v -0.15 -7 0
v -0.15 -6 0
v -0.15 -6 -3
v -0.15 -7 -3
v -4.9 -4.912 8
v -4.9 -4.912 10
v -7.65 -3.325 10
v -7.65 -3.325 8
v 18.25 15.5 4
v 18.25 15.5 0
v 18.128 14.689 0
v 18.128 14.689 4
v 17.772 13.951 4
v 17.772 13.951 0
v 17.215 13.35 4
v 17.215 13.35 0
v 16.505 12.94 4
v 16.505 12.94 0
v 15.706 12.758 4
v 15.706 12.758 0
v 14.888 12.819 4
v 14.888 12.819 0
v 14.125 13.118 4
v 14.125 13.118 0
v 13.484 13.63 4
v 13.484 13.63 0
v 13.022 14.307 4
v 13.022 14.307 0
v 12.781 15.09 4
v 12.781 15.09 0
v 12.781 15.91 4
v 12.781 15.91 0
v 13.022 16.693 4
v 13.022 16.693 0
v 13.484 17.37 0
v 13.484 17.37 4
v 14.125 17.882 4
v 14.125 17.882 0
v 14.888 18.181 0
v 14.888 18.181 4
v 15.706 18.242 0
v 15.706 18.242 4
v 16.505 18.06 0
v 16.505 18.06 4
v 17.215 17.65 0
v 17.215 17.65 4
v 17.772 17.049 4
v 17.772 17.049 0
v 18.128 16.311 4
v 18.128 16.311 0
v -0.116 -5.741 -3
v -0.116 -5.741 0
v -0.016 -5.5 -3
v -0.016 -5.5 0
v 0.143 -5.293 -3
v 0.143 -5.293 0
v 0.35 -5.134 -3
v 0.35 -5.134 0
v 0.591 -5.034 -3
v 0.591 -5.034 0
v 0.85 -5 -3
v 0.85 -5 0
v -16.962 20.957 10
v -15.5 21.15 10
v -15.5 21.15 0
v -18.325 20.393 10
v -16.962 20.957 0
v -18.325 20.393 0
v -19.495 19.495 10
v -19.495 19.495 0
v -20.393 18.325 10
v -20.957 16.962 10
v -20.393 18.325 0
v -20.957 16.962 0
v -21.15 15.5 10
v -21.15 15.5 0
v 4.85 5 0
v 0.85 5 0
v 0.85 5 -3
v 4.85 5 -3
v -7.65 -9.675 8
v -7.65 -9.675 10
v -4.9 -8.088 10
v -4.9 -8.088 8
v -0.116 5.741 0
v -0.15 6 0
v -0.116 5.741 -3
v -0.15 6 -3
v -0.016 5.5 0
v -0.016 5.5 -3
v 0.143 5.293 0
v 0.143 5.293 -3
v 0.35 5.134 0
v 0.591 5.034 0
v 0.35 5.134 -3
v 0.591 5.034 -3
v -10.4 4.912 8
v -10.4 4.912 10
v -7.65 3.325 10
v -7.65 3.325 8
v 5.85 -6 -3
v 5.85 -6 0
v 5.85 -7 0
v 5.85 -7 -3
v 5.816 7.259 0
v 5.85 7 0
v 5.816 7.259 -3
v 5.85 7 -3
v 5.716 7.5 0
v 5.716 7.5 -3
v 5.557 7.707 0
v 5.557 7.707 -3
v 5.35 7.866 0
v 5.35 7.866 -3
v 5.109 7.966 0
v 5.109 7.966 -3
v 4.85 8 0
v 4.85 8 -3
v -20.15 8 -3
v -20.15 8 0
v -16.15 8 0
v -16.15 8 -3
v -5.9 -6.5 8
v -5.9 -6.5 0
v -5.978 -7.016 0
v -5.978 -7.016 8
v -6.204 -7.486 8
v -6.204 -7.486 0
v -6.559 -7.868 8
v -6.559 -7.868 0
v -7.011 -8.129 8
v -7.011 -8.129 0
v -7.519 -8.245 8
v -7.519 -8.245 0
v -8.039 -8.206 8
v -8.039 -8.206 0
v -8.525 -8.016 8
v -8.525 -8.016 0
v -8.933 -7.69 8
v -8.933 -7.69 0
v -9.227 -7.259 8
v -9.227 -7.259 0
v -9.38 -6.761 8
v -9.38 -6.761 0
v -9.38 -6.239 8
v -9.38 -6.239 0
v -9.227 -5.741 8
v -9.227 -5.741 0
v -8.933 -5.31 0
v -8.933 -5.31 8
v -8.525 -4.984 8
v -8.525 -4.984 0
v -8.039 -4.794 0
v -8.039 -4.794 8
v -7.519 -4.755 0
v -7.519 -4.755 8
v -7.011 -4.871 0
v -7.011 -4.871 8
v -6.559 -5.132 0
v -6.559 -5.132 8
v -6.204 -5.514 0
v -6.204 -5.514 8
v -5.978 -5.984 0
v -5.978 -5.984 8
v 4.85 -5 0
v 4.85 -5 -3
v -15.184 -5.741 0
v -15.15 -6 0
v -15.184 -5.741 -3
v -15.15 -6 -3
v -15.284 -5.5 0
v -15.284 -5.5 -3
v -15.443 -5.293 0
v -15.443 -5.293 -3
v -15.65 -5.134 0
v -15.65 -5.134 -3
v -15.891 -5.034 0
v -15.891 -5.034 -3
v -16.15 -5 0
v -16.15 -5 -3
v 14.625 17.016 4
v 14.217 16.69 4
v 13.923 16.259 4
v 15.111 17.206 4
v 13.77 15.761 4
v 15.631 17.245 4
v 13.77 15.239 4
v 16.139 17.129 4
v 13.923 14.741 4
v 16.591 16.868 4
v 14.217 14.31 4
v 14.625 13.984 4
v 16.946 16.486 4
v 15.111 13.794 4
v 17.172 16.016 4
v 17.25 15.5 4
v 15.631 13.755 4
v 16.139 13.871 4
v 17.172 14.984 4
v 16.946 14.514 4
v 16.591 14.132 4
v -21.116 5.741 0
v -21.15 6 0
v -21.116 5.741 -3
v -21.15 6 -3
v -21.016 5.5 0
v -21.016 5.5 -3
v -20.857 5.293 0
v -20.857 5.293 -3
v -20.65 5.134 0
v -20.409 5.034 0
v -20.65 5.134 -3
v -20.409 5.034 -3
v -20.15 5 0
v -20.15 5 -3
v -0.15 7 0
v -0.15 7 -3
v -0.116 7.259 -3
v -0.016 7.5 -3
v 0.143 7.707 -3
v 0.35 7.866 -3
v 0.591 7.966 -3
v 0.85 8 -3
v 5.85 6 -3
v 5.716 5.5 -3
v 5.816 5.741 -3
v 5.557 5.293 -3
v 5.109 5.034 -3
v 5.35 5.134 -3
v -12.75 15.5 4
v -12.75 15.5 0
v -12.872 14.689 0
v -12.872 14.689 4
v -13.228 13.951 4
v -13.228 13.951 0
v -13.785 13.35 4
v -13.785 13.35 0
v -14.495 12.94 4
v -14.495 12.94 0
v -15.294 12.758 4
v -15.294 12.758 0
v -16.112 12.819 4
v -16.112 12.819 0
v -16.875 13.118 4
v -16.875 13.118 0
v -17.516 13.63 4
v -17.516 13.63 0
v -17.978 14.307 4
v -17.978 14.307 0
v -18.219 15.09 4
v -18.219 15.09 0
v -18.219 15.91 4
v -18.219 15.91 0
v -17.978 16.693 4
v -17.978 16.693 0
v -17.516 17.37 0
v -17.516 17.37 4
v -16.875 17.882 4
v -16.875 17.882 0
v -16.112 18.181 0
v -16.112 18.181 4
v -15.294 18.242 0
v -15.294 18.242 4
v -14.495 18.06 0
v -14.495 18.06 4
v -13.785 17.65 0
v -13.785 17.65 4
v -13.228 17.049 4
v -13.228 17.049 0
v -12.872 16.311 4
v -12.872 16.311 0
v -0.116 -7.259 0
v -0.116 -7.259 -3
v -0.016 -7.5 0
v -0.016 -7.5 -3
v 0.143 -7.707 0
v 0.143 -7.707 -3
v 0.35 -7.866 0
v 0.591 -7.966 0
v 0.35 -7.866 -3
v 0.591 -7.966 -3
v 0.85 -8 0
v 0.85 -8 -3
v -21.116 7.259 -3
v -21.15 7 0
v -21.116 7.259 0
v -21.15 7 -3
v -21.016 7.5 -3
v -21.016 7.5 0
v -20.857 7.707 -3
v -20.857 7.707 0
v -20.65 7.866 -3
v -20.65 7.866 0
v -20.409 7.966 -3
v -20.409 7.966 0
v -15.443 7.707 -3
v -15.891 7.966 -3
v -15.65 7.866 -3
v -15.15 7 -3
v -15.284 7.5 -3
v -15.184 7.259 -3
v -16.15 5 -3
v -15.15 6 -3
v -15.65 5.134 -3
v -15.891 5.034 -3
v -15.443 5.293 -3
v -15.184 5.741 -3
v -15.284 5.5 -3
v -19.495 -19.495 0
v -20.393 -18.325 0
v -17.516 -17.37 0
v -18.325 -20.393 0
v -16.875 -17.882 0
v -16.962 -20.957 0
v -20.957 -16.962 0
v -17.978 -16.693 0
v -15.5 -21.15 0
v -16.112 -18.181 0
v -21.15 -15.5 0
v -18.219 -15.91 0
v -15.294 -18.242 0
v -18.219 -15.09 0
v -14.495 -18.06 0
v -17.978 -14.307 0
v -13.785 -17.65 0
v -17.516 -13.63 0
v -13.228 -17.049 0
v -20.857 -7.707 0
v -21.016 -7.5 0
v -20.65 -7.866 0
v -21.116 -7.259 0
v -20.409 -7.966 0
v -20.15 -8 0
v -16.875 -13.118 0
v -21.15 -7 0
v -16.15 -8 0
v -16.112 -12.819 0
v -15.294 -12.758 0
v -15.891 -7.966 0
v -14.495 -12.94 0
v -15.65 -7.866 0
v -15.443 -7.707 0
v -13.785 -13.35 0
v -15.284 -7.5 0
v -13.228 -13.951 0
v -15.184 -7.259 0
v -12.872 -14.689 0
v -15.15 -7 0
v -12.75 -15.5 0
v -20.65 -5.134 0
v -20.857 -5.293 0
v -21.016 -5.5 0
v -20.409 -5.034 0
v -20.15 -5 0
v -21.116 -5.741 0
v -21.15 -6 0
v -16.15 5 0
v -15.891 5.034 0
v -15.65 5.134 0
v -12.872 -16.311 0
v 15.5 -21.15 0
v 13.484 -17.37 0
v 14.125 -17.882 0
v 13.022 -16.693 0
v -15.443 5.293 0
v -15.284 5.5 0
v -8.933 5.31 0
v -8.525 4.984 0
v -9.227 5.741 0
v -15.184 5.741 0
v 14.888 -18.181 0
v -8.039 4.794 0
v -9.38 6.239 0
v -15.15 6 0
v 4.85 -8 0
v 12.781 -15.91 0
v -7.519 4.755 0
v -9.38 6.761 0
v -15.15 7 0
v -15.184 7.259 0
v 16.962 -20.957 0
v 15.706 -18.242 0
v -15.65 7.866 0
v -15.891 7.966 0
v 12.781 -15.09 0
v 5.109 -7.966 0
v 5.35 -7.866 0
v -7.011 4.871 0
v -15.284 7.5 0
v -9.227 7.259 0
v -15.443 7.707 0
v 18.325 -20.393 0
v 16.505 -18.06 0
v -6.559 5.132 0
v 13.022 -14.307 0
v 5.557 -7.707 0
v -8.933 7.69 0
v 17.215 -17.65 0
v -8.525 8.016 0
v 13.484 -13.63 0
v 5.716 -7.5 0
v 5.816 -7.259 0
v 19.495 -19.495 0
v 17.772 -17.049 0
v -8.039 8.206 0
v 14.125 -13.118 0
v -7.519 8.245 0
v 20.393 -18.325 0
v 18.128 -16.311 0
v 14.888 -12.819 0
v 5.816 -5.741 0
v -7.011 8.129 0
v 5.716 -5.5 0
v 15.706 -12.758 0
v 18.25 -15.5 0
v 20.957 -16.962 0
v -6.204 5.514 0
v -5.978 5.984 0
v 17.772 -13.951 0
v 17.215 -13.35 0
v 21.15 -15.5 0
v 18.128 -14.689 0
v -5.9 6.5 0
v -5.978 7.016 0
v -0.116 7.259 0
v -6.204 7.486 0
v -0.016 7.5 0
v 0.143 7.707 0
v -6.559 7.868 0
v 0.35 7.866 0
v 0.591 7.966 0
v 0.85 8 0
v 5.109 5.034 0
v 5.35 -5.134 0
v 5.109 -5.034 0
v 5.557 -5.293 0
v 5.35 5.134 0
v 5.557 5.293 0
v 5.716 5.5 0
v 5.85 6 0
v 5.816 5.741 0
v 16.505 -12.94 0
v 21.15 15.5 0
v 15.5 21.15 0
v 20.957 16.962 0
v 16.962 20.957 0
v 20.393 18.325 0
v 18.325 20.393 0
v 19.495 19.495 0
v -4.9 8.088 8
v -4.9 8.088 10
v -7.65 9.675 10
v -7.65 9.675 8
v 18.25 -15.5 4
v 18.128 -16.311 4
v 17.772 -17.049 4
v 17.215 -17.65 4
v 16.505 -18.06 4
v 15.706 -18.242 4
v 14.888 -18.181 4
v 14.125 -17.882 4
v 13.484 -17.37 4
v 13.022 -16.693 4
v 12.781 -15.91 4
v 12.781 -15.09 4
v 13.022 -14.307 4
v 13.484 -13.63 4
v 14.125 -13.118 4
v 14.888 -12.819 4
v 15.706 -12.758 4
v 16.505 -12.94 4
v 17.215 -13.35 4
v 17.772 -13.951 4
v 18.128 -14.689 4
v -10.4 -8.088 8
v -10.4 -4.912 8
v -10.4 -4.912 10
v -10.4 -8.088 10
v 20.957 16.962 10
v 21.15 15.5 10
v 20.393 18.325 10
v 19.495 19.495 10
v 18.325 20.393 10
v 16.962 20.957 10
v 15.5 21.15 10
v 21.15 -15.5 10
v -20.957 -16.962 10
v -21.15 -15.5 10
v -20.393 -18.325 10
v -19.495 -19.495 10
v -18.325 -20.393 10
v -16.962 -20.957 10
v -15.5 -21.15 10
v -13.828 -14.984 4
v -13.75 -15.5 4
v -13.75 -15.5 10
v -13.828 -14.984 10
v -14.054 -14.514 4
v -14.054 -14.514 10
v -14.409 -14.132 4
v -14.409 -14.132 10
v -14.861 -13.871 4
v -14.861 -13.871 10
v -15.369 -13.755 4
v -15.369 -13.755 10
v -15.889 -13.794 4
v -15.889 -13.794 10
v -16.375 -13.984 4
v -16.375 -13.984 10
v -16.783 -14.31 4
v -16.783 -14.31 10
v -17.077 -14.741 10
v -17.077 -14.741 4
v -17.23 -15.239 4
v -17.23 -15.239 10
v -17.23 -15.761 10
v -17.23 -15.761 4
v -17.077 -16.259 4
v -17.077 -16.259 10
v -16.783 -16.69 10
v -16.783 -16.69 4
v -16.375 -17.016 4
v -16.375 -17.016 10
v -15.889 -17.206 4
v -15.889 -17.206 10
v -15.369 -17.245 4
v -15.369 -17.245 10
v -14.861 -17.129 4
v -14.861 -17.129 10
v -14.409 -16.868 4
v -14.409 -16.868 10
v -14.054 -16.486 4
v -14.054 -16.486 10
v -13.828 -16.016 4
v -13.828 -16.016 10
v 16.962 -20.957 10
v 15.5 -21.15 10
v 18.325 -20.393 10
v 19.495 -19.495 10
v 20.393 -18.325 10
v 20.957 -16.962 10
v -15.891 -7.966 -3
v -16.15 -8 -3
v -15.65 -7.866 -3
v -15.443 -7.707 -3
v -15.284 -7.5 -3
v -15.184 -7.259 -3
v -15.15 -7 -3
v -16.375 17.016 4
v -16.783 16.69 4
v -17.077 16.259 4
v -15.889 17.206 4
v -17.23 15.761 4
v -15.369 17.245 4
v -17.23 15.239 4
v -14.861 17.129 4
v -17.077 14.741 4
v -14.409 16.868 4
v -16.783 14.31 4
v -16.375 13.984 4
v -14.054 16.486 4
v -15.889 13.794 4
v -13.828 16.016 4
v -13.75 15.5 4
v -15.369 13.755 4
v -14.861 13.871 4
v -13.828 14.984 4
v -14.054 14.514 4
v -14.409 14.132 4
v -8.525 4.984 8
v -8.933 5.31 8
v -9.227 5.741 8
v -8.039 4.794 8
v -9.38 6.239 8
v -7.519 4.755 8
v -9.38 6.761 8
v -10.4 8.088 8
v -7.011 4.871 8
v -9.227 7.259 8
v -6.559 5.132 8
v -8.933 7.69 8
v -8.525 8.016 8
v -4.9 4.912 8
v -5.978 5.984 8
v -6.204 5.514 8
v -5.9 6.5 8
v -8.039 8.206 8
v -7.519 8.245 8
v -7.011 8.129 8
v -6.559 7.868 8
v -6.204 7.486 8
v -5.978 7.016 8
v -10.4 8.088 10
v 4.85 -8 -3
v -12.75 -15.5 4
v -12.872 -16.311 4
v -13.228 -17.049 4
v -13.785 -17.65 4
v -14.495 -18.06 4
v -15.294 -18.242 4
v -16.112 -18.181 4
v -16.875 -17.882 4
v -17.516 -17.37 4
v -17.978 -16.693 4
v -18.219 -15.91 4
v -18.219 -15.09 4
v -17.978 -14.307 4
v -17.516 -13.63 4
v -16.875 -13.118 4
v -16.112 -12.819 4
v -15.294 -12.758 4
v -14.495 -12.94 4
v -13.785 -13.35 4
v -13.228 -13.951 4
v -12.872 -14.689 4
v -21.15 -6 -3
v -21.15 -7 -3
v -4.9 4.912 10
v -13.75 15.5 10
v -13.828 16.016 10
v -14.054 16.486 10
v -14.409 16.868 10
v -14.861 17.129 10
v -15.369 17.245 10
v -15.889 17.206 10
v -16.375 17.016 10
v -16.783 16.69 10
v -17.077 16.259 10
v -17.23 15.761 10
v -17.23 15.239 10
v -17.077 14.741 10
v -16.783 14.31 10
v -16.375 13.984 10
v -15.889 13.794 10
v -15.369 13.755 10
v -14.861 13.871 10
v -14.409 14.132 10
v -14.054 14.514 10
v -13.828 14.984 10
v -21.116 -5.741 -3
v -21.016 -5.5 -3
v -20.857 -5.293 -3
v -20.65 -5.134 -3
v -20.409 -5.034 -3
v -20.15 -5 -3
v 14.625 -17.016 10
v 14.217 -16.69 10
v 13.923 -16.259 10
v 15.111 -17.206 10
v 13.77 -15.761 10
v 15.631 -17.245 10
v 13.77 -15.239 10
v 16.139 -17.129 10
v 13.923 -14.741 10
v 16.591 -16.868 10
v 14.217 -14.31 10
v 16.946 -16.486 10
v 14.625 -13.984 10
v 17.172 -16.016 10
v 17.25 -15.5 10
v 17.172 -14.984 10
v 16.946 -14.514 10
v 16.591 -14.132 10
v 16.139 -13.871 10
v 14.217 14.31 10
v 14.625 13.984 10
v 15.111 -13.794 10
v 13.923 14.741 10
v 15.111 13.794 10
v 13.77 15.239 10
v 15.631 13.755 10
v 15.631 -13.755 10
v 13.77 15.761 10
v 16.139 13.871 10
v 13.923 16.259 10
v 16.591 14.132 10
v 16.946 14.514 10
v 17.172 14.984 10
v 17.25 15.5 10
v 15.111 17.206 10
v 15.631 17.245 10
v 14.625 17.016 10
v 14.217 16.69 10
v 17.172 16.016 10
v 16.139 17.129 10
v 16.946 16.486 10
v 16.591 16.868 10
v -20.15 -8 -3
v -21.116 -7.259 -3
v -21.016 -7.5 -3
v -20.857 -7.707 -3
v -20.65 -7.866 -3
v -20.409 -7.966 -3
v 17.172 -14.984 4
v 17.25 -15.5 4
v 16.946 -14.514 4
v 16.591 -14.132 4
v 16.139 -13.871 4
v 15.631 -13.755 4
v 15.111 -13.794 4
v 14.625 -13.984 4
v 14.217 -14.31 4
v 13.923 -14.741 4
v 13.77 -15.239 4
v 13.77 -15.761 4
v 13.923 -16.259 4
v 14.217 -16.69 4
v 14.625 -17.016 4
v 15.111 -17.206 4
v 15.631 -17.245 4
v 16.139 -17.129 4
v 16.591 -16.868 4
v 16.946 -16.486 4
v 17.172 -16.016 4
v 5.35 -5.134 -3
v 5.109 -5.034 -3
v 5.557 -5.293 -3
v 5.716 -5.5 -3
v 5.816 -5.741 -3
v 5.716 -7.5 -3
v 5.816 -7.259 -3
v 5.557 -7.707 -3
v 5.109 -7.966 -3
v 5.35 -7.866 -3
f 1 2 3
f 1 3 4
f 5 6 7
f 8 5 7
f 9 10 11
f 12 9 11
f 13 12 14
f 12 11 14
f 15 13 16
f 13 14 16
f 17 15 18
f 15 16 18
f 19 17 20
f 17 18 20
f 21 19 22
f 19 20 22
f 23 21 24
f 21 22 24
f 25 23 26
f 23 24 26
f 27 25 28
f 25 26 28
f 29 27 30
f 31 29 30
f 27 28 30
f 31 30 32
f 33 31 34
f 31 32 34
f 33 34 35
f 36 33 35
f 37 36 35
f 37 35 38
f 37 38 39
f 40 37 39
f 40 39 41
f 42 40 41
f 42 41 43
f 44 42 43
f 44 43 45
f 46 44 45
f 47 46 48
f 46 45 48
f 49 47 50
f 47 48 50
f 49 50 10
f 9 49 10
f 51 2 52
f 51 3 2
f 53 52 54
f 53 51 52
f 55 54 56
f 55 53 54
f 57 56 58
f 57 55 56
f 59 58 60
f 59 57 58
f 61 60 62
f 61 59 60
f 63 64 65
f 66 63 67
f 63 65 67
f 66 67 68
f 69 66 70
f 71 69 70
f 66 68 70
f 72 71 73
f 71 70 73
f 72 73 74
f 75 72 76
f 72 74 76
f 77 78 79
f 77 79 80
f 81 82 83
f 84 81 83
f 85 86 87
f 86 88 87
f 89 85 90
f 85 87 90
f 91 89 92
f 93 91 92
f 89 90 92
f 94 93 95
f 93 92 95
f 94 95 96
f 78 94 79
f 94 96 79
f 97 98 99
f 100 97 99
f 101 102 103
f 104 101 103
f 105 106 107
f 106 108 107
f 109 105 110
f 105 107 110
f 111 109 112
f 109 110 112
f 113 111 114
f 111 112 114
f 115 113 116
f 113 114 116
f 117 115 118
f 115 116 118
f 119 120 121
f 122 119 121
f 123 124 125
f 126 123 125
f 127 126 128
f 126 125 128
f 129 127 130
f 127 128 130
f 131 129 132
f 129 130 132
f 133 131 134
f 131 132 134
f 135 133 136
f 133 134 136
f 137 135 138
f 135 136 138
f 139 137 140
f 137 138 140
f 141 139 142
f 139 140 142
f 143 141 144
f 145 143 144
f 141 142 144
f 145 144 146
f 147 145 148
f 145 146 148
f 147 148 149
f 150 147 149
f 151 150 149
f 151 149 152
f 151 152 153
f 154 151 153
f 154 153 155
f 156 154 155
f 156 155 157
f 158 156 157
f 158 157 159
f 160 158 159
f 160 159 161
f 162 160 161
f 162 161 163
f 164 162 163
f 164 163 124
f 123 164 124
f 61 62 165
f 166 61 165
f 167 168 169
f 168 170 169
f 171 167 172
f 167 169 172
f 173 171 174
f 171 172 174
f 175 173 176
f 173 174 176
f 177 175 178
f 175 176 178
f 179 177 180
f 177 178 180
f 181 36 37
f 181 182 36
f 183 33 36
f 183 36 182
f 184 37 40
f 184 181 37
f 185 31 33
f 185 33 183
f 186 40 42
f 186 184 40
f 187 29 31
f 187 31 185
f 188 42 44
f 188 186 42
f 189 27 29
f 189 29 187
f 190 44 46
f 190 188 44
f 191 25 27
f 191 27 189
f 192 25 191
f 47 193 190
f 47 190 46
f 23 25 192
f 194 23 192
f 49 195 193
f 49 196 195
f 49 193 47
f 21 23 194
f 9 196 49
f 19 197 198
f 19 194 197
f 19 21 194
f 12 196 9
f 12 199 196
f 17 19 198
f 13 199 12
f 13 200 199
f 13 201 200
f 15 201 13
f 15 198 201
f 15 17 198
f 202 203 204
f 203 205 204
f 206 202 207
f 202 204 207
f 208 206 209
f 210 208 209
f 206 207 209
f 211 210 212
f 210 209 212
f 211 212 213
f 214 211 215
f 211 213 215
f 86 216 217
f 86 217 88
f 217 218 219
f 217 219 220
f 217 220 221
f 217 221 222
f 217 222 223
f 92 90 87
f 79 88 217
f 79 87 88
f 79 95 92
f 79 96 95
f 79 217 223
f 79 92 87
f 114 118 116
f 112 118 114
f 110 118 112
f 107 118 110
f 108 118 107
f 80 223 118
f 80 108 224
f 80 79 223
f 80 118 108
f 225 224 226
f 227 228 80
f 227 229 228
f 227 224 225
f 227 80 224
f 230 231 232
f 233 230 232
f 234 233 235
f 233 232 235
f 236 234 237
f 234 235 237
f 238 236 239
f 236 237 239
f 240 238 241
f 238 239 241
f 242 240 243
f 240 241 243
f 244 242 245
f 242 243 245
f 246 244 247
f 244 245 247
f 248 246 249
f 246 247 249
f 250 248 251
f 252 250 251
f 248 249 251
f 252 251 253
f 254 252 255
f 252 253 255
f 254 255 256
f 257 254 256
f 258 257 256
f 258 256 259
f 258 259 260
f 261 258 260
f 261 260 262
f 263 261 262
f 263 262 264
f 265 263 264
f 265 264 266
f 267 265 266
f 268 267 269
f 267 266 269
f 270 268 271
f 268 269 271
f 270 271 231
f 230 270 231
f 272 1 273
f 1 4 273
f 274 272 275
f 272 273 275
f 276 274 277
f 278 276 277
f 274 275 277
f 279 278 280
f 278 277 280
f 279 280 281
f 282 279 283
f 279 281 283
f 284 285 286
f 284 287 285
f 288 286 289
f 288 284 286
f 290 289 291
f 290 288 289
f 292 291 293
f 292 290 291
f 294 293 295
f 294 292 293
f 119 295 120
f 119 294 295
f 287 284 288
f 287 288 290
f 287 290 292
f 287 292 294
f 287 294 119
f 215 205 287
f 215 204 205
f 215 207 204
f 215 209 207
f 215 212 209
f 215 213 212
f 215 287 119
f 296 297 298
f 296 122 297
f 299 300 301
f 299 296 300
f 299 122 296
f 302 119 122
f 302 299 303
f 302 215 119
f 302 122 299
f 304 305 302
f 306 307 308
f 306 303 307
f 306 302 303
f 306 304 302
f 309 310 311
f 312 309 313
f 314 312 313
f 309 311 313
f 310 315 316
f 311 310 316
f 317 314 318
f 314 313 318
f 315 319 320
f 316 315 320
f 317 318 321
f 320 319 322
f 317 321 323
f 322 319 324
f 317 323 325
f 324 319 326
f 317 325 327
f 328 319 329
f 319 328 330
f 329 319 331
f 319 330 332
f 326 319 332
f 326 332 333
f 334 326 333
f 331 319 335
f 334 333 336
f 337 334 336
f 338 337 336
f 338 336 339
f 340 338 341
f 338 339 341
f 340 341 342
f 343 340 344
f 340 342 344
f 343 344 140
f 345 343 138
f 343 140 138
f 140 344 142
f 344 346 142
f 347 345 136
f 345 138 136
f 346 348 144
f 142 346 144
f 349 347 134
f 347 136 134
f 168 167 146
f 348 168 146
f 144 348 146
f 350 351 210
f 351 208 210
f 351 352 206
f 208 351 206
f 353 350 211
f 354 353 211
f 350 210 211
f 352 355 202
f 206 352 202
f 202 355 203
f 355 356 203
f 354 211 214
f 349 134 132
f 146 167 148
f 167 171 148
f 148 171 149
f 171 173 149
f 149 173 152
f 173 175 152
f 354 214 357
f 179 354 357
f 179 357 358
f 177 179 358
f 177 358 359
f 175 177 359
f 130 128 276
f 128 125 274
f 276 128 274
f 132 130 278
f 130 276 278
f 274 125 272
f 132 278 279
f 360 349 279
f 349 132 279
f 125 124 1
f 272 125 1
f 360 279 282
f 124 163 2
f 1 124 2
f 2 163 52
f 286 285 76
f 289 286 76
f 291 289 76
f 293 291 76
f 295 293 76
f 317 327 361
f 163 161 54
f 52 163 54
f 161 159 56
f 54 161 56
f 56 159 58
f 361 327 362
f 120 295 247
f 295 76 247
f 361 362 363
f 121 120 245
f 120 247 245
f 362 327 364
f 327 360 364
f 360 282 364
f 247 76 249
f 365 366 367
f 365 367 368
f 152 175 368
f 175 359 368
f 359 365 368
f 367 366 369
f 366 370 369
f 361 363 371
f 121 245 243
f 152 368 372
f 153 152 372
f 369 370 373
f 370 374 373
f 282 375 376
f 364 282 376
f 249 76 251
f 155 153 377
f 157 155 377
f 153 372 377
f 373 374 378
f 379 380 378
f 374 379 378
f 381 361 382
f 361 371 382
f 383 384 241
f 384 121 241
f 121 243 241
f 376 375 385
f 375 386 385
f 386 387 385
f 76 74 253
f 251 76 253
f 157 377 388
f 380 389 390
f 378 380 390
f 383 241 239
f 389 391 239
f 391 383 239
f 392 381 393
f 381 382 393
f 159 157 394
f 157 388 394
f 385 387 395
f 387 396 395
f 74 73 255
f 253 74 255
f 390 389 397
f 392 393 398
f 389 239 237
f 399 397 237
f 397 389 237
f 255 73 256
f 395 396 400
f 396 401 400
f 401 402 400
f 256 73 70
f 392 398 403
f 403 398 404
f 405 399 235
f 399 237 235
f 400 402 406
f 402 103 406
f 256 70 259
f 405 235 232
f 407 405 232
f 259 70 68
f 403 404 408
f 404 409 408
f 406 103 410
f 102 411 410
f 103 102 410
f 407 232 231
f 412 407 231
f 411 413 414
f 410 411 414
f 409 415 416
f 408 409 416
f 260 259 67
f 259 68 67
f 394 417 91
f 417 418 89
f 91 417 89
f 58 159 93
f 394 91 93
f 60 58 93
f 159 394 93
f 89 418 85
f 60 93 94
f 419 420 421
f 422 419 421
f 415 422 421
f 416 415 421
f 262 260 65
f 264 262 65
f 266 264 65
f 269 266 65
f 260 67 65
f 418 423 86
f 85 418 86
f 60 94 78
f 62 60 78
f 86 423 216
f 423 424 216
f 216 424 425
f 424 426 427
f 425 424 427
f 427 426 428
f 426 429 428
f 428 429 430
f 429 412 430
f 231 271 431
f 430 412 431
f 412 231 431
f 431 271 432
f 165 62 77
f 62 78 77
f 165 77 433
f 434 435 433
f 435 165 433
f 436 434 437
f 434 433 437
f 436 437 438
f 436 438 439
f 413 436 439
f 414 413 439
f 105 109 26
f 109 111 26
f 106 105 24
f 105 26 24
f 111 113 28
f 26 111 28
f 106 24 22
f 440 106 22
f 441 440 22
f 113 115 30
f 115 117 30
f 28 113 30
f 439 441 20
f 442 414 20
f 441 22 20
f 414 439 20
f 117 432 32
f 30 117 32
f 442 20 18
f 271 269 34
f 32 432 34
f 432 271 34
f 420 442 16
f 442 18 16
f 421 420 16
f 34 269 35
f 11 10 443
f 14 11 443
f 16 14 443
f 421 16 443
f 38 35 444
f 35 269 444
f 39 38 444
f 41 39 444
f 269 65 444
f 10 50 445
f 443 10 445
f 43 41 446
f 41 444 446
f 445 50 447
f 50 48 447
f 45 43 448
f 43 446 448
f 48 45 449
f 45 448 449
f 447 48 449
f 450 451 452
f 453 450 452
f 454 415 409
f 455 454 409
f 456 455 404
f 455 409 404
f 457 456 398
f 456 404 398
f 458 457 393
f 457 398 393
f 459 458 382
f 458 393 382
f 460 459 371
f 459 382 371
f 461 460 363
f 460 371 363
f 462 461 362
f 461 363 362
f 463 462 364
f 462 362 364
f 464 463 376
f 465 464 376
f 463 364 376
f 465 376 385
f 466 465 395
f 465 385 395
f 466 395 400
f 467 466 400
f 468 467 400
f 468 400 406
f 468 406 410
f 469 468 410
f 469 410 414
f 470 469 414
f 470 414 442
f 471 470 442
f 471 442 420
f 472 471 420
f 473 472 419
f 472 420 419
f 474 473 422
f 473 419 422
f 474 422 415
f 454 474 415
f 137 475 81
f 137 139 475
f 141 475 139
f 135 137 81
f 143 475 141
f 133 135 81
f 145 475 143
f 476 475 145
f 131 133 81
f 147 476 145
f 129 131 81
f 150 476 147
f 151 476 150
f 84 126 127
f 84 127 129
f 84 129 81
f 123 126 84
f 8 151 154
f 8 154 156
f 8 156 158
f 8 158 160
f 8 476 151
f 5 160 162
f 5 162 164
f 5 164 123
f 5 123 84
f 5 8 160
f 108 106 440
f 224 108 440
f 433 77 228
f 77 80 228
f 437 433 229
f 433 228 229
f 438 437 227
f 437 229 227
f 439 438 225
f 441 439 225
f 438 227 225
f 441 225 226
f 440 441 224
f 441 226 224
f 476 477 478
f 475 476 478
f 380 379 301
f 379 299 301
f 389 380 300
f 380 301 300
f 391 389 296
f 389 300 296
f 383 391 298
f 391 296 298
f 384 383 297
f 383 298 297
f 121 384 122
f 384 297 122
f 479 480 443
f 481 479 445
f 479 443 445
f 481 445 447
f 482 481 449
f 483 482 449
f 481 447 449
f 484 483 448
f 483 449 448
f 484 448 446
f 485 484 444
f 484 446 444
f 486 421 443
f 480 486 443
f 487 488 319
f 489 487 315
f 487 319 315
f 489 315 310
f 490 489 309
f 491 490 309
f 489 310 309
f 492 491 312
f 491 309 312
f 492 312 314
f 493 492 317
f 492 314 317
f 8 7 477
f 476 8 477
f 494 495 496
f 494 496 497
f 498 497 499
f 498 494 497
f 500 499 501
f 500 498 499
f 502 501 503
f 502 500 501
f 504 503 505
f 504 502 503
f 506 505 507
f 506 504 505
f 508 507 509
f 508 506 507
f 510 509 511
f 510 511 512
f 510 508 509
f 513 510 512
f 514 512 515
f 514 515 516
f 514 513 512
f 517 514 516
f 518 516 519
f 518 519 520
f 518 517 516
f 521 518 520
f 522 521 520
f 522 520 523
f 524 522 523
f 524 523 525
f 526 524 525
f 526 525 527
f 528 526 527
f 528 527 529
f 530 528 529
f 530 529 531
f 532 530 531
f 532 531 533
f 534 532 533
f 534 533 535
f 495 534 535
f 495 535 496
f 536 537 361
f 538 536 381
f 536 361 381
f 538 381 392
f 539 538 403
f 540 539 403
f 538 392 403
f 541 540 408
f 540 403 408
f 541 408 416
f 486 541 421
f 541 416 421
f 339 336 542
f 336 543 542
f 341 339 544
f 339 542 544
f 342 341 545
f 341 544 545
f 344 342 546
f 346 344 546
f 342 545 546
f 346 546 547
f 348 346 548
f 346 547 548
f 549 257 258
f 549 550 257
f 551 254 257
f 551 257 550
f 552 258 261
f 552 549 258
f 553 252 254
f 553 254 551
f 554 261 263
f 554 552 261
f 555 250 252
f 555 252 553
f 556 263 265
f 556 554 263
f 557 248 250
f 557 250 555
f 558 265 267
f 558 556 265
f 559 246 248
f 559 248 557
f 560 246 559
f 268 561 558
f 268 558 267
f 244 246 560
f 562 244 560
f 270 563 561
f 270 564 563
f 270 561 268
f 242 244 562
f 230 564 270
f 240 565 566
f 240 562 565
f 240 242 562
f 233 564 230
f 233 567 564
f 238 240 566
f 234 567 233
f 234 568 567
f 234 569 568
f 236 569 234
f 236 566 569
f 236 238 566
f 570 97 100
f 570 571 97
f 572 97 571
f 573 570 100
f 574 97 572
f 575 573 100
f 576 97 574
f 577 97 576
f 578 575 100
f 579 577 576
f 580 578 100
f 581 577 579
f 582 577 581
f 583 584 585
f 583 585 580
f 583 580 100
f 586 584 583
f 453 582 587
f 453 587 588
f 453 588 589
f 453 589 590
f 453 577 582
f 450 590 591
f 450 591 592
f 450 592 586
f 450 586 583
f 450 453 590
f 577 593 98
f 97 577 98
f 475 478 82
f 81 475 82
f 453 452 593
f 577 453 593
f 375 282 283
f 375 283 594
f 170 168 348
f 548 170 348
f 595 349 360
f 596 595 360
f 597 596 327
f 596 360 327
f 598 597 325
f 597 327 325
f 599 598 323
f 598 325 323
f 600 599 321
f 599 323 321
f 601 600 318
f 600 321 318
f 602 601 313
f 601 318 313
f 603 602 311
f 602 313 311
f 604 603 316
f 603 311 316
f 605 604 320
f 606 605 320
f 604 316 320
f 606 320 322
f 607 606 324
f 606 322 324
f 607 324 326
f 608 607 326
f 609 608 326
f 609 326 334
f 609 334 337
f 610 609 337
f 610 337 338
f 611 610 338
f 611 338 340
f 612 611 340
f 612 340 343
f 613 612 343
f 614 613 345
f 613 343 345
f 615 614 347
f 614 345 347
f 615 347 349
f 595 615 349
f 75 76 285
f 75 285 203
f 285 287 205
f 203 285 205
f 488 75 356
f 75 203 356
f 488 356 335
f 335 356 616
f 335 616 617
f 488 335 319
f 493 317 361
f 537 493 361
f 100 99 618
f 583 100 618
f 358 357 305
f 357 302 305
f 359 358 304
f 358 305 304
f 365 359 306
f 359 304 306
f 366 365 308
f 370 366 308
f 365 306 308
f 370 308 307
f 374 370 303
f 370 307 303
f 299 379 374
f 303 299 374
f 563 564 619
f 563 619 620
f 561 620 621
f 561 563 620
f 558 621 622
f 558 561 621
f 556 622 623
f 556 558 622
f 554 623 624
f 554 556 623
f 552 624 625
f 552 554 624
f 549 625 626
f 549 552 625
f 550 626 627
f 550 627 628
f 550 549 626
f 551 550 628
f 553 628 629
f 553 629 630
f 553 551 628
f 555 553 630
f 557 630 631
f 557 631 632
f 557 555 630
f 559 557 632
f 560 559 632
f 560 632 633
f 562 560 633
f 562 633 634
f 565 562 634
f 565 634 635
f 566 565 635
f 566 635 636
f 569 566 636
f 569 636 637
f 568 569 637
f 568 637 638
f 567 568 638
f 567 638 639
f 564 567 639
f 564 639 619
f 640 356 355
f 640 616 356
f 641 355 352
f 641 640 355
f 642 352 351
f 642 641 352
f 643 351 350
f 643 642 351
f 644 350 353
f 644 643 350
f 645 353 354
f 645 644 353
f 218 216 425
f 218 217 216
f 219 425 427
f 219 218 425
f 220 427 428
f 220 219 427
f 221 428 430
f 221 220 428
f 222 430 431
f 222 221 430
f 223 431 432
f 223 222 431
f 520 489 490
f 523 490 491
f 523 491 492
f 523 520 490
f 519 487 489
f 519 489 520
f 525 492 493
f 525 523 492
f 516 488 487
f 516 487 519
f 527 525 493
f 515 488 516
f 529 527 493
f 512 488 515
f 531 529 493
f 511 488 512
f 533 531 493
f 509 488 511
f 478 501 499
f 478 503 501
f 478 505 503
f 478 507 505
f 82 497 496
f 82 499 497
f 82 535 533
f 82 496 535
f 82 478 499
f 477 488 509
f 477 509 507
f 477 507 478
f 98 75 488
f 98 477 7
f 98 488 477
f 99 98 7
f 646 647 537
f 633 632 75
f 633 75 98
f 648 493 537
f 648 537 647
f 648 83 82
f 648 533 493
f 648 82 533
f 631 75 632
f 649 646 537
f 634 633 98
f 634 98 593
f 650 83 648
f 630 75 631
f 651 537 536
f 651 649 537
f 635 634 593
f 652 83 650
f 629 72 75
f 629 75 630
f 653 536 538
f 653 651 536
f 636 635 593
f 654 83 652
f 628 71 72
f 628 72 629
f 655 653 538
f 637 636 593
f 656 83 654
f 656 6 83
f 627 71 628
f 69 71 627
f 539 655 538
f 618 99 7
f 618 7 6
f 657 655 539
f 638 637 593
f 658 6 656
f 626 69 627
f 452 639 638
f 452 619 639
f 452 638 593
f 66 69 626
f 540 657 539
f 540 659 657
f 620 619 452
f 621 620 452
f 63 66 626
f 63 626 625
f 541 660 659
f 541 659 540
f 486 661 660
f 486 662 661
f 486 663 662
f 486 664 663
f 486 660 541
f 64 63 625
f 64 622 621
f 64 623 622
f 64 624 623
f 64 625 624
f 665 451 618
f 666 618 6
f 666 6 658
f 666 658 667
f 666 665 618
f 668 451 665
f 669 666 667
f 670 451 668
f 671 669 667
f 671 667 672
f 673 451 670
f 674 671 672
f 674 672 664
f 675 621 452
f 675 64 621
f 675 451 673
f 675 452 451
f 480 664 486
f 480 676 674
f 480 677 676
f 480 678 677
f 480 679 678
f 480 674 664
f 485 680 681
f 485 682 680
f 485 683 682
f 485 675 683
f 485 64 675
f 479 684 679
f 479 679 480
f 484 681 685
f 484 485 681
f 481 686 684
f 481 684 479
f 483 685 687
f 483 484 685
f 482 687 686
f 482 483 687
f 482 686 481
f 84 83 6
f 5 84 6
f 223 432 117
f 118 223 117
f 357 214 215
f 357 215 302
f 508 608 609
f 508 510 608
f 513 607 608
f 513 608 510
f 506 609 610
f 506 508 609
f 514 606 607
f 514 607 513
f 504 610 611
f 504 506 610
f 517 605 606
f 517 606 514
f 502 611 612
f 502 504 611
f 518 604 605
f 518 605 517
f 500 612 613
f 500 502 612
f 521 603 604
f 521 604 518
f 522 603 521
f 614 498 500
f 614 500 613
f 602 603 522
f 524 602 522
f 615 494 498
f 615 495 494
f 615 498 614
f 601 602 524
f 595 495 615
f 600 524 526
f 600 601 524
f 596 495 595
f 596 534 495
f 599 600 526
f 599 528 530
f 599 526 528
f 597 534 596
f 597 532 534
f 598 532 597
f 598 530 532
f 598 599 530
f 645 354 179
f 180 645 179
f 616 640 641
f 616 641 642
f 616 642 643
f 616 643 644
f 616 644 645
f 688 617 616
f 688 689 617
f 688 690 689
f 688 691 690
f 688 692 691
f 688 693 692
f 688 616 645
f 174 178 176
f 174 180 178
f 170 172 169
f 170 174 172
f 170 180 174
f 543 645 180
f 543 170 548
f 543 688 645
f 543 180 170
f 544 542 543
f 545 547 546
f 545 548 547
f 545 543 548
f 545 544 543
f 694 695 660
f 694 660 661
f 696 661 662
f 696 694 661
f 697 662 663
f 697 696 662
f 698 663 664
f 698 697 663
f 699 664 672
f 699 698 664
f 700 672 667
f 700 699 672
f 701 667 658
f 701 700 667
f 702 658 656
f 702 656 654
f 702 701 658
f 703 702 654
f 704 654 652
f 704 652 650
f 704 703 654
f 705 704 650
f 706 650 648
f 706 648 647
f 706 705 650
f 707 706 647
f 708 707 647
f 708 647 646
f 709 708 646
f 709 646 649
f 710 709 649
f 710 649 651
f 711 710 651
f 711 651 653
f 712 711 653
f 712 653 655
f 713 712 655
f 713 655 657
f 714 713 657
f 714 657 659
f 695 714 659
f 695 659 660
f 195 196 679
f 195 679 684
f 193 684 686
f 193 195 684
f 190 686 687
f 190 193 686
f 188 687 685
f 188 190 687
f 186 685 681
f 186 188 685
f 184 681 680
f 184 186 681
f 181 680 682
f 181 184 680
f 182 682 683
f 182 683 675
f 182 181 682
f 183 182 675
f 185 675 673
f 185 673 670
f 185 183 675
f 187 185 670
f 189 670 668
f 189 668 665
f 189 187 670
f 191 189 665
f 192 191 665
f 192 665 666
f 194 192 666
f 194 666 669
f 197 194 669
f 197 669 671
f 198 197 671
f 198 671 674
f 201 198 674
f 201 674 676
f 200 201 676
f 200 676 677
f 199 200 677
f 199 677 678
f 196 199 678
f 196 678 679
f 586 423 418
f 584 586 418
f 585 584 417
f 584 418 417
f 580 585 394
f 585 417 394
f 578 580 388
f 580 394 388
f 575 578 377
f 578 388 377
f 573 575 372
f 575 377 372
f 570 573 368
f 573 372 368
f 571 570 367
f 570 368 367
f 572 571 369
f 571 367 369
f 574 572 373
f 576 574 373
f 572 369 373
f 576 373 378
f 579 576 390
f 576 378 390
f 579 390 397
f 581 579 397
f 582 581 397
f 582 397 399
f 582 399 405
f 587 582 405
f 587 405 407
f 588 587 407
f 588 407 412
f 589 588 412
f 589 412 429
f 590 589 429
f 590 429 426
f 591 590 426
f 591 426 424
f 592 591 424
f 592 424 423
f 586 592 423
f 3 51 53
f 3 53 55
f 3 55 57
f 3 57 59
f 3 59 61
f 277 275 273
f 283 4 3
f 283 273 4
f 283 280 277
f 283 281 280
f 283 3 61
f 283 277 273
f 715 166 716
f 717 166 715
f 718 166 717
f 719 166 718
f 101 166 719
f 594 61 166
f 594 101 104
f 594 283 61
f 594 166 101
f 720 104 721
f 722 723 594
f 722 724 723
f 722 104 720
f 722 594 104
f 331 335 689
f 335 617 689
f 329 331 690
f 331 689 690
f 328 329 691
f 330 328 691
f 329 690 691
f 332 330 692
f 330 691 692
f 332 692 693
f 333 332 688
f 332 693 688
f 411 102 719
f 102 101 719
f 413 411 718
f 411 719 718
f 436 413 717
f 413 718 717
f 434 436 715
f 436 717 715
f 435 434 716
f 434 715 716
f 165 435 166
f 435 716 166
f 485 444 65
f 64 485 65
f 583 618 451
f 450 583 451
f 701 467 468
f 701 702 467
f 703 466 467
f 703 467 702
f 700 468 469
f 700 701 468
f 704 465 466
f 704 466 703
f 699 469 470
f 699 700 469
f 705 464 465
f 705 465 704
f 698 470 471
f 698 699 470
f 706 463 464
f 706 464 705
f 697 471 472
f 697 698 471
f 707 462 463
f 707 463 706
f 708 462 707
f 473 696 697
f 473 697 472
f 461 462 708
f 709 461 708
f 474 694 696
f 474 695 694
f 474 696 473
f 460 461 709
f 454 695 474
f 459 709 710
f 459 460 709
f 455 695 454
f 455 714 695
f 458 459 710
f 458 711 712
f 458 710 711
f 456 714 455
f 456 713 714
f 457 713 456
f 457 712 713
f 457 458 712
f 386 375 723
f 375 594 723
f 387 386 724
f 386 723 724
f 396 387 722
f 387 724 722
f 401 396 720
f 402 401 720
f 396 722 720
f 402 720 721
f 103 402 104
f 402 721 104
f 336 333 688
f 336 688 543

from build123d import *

# Parameters (mm, degrees)
F0_R     = 1.75
F1_DEPTH = 10
F2_R     = 2.75
F2_R_2   = 1.75
F3_DEPTH = 4
F4_W     = 6
F4_H     = 3
F5_DEPTH = 3
F6_R     = 1
F4_R     = 1.75
F7_DEPTH = 25
F9_DEPTH = 2


with BuildPart() as f1:
    # F0 (on Top) → F1 (new body)
    with BuildSketch(Plane.XY):
        with BuildLine():
            Line((-15.5, -21.15), (15.5, -21.15))
            ThreePointArc((15.5, -21.15), (19.495153, -19.495153), (21.15, -15.5))
            Line((21.15, -15.5), (21.15, 15.5))
            ThreePointArc((21.15, 15.5), (19.495153, 19.495153), (15.5, 21.15))
            Line((15.5, 21.15), (-15.5, 21.15))
            ThreePointArc((-15.5, 21.15), (-19.495153, 19.495153), (-21.15, 15.5))
            Line((-21.15, 15.5), (-21.15, -15.5))
            ThreePointArc((-21.15, -15.5), (-19.495153, -19.495153), (-15.5, -21.15))
        make_face()
        with Locations((-15.5, -15.5)):
            Circle(F0_R, mode=Mode.SUBTRACT)
        with Locations((15.5, -15.5)):
            Circle(F0_R, mode=Mode.SUBTRACT)
        with Locations((-15.5, 15.5)):
            Circle(F0_R, mode=Mode.SUBTRACT)
        with Locations((15.5, 15.5)):
            Circle(F0_R, mode=Mode.SUBTRACT)
    extrude(amount=F1_DEPTH)

    # F2 (on face) → F3 (cut)
    with BuildSketch(Plane(origin=(0, 0, 0), x_dir=(1, 0, 0), z_dir=(0, 0, -1))):
        with Locations((15.5, 15.5)):
            Circle(F2_R)
        with Locations((15.5, 15.5)):
            Circle(F2_R_2, mode=Mode.SUBTRACT)
        with Locations((15.5, -15.5)):
            Circle(F2_R)
        with Locations((15.5, -15.5)):
            Circle(F2_R_2, mode=Mode.SUBTRACT)
        with Locations((-15.5, -15.5)):
            Circle(F2_R)
        with Locations((-15.5, -15.5)):
            Circle(F2_R_2, mode=Mode.SUBTRACT)
        with Locations((-15.5, 15.5)):
            Circle(F2_R)
        with Locations((-15.5, 15.5)):
            Circle(F2_R_2, mode=Mode.SUBTRACT)
    extrude(amount=-F3_DEPTH, mode=Mode.SUBTRACT)

    # F4 (on face) → F5 (join)
    with BuildSketch(Plane(origin=(0, 0, 0), x_dir=(1, 0, 0), z_dir=(0, 0, -1))):
        with Locations((2.85, 6.5)):
            Rectangle(F4_W, F4_H)
        with Locations((-18.15, -6.5)):
            Rectangle(F4_W, F4_H)
        with Locations((-18.15, 6.5)):
            Rectangle(F4_W, F4_H)
        with Locations((2.85, -6.5)):
            Rectangle(F4_W, F4_H)
    extrude(amount=F5_DEPTH)

    # F6
    f6_edges = [f1.edges().sort_by_distance(p)[0] for p in [
        (-21.15, -8, -1.5),
        (-21.15, -5, -1.5),
        (-21.15, 5, -1.5),
        (-15.15, 5, -1.5),
        (-15.15, -8, -1.5),
        (-0.15, -8, -1.5),
        (-0.15, -5, -1.5),
        (-0.15, 5, -1.5),
        (-0.15, 8, -1.5),
        (5.85, -8, -1.5),
        (5.85, 5, -1.5),
        (5.85, -5, -1.5),
        (5.85, 8, -1.5),
        (-15.15, 8, -1.5),
        (-21.15, 8, -1.5),
        (-15.15, -5, -1.5),
    ]]
    fillet(f6_edges, radius=F6_R)

    # F4 (on face) → F7 (cut)
    with BuildSketch(Plane(origin=(0, 0, 0), x_dir=(1, 0, 0), z_dir=(0, 0, -1))):
        with Locations((-7.65, 6.5)):
            Circle(F4_R)
        with Locations((-7.65, -6.5)):
            Circle(F4_R)
    extrude(amount=-F7_DEPTH, mode=Mode.SUBTRACT)

    # F8 (on face) → F9 (cut)
    with BuildSketch(Plane.XY.offset(10)):
        Polygon((-4.9, 4.912287), (-4.9, 8.087713), (-7.65, 9.675426), (-10.4, 8.087713), (-10.4, 4.912287), (-7.65, 3.324574), align=None)
        Polygon((-4.9, -8.087713), (-4.9, -4.912287), (-7.65, -3.324574), (-10.4, -4.912287), (-10.4, -8.087713), (-7.65, -9.675426), align=None)
    extrude(amount=-F9_DEPTH, mode=Mode.SUBTRACT)


solid = f1.part
